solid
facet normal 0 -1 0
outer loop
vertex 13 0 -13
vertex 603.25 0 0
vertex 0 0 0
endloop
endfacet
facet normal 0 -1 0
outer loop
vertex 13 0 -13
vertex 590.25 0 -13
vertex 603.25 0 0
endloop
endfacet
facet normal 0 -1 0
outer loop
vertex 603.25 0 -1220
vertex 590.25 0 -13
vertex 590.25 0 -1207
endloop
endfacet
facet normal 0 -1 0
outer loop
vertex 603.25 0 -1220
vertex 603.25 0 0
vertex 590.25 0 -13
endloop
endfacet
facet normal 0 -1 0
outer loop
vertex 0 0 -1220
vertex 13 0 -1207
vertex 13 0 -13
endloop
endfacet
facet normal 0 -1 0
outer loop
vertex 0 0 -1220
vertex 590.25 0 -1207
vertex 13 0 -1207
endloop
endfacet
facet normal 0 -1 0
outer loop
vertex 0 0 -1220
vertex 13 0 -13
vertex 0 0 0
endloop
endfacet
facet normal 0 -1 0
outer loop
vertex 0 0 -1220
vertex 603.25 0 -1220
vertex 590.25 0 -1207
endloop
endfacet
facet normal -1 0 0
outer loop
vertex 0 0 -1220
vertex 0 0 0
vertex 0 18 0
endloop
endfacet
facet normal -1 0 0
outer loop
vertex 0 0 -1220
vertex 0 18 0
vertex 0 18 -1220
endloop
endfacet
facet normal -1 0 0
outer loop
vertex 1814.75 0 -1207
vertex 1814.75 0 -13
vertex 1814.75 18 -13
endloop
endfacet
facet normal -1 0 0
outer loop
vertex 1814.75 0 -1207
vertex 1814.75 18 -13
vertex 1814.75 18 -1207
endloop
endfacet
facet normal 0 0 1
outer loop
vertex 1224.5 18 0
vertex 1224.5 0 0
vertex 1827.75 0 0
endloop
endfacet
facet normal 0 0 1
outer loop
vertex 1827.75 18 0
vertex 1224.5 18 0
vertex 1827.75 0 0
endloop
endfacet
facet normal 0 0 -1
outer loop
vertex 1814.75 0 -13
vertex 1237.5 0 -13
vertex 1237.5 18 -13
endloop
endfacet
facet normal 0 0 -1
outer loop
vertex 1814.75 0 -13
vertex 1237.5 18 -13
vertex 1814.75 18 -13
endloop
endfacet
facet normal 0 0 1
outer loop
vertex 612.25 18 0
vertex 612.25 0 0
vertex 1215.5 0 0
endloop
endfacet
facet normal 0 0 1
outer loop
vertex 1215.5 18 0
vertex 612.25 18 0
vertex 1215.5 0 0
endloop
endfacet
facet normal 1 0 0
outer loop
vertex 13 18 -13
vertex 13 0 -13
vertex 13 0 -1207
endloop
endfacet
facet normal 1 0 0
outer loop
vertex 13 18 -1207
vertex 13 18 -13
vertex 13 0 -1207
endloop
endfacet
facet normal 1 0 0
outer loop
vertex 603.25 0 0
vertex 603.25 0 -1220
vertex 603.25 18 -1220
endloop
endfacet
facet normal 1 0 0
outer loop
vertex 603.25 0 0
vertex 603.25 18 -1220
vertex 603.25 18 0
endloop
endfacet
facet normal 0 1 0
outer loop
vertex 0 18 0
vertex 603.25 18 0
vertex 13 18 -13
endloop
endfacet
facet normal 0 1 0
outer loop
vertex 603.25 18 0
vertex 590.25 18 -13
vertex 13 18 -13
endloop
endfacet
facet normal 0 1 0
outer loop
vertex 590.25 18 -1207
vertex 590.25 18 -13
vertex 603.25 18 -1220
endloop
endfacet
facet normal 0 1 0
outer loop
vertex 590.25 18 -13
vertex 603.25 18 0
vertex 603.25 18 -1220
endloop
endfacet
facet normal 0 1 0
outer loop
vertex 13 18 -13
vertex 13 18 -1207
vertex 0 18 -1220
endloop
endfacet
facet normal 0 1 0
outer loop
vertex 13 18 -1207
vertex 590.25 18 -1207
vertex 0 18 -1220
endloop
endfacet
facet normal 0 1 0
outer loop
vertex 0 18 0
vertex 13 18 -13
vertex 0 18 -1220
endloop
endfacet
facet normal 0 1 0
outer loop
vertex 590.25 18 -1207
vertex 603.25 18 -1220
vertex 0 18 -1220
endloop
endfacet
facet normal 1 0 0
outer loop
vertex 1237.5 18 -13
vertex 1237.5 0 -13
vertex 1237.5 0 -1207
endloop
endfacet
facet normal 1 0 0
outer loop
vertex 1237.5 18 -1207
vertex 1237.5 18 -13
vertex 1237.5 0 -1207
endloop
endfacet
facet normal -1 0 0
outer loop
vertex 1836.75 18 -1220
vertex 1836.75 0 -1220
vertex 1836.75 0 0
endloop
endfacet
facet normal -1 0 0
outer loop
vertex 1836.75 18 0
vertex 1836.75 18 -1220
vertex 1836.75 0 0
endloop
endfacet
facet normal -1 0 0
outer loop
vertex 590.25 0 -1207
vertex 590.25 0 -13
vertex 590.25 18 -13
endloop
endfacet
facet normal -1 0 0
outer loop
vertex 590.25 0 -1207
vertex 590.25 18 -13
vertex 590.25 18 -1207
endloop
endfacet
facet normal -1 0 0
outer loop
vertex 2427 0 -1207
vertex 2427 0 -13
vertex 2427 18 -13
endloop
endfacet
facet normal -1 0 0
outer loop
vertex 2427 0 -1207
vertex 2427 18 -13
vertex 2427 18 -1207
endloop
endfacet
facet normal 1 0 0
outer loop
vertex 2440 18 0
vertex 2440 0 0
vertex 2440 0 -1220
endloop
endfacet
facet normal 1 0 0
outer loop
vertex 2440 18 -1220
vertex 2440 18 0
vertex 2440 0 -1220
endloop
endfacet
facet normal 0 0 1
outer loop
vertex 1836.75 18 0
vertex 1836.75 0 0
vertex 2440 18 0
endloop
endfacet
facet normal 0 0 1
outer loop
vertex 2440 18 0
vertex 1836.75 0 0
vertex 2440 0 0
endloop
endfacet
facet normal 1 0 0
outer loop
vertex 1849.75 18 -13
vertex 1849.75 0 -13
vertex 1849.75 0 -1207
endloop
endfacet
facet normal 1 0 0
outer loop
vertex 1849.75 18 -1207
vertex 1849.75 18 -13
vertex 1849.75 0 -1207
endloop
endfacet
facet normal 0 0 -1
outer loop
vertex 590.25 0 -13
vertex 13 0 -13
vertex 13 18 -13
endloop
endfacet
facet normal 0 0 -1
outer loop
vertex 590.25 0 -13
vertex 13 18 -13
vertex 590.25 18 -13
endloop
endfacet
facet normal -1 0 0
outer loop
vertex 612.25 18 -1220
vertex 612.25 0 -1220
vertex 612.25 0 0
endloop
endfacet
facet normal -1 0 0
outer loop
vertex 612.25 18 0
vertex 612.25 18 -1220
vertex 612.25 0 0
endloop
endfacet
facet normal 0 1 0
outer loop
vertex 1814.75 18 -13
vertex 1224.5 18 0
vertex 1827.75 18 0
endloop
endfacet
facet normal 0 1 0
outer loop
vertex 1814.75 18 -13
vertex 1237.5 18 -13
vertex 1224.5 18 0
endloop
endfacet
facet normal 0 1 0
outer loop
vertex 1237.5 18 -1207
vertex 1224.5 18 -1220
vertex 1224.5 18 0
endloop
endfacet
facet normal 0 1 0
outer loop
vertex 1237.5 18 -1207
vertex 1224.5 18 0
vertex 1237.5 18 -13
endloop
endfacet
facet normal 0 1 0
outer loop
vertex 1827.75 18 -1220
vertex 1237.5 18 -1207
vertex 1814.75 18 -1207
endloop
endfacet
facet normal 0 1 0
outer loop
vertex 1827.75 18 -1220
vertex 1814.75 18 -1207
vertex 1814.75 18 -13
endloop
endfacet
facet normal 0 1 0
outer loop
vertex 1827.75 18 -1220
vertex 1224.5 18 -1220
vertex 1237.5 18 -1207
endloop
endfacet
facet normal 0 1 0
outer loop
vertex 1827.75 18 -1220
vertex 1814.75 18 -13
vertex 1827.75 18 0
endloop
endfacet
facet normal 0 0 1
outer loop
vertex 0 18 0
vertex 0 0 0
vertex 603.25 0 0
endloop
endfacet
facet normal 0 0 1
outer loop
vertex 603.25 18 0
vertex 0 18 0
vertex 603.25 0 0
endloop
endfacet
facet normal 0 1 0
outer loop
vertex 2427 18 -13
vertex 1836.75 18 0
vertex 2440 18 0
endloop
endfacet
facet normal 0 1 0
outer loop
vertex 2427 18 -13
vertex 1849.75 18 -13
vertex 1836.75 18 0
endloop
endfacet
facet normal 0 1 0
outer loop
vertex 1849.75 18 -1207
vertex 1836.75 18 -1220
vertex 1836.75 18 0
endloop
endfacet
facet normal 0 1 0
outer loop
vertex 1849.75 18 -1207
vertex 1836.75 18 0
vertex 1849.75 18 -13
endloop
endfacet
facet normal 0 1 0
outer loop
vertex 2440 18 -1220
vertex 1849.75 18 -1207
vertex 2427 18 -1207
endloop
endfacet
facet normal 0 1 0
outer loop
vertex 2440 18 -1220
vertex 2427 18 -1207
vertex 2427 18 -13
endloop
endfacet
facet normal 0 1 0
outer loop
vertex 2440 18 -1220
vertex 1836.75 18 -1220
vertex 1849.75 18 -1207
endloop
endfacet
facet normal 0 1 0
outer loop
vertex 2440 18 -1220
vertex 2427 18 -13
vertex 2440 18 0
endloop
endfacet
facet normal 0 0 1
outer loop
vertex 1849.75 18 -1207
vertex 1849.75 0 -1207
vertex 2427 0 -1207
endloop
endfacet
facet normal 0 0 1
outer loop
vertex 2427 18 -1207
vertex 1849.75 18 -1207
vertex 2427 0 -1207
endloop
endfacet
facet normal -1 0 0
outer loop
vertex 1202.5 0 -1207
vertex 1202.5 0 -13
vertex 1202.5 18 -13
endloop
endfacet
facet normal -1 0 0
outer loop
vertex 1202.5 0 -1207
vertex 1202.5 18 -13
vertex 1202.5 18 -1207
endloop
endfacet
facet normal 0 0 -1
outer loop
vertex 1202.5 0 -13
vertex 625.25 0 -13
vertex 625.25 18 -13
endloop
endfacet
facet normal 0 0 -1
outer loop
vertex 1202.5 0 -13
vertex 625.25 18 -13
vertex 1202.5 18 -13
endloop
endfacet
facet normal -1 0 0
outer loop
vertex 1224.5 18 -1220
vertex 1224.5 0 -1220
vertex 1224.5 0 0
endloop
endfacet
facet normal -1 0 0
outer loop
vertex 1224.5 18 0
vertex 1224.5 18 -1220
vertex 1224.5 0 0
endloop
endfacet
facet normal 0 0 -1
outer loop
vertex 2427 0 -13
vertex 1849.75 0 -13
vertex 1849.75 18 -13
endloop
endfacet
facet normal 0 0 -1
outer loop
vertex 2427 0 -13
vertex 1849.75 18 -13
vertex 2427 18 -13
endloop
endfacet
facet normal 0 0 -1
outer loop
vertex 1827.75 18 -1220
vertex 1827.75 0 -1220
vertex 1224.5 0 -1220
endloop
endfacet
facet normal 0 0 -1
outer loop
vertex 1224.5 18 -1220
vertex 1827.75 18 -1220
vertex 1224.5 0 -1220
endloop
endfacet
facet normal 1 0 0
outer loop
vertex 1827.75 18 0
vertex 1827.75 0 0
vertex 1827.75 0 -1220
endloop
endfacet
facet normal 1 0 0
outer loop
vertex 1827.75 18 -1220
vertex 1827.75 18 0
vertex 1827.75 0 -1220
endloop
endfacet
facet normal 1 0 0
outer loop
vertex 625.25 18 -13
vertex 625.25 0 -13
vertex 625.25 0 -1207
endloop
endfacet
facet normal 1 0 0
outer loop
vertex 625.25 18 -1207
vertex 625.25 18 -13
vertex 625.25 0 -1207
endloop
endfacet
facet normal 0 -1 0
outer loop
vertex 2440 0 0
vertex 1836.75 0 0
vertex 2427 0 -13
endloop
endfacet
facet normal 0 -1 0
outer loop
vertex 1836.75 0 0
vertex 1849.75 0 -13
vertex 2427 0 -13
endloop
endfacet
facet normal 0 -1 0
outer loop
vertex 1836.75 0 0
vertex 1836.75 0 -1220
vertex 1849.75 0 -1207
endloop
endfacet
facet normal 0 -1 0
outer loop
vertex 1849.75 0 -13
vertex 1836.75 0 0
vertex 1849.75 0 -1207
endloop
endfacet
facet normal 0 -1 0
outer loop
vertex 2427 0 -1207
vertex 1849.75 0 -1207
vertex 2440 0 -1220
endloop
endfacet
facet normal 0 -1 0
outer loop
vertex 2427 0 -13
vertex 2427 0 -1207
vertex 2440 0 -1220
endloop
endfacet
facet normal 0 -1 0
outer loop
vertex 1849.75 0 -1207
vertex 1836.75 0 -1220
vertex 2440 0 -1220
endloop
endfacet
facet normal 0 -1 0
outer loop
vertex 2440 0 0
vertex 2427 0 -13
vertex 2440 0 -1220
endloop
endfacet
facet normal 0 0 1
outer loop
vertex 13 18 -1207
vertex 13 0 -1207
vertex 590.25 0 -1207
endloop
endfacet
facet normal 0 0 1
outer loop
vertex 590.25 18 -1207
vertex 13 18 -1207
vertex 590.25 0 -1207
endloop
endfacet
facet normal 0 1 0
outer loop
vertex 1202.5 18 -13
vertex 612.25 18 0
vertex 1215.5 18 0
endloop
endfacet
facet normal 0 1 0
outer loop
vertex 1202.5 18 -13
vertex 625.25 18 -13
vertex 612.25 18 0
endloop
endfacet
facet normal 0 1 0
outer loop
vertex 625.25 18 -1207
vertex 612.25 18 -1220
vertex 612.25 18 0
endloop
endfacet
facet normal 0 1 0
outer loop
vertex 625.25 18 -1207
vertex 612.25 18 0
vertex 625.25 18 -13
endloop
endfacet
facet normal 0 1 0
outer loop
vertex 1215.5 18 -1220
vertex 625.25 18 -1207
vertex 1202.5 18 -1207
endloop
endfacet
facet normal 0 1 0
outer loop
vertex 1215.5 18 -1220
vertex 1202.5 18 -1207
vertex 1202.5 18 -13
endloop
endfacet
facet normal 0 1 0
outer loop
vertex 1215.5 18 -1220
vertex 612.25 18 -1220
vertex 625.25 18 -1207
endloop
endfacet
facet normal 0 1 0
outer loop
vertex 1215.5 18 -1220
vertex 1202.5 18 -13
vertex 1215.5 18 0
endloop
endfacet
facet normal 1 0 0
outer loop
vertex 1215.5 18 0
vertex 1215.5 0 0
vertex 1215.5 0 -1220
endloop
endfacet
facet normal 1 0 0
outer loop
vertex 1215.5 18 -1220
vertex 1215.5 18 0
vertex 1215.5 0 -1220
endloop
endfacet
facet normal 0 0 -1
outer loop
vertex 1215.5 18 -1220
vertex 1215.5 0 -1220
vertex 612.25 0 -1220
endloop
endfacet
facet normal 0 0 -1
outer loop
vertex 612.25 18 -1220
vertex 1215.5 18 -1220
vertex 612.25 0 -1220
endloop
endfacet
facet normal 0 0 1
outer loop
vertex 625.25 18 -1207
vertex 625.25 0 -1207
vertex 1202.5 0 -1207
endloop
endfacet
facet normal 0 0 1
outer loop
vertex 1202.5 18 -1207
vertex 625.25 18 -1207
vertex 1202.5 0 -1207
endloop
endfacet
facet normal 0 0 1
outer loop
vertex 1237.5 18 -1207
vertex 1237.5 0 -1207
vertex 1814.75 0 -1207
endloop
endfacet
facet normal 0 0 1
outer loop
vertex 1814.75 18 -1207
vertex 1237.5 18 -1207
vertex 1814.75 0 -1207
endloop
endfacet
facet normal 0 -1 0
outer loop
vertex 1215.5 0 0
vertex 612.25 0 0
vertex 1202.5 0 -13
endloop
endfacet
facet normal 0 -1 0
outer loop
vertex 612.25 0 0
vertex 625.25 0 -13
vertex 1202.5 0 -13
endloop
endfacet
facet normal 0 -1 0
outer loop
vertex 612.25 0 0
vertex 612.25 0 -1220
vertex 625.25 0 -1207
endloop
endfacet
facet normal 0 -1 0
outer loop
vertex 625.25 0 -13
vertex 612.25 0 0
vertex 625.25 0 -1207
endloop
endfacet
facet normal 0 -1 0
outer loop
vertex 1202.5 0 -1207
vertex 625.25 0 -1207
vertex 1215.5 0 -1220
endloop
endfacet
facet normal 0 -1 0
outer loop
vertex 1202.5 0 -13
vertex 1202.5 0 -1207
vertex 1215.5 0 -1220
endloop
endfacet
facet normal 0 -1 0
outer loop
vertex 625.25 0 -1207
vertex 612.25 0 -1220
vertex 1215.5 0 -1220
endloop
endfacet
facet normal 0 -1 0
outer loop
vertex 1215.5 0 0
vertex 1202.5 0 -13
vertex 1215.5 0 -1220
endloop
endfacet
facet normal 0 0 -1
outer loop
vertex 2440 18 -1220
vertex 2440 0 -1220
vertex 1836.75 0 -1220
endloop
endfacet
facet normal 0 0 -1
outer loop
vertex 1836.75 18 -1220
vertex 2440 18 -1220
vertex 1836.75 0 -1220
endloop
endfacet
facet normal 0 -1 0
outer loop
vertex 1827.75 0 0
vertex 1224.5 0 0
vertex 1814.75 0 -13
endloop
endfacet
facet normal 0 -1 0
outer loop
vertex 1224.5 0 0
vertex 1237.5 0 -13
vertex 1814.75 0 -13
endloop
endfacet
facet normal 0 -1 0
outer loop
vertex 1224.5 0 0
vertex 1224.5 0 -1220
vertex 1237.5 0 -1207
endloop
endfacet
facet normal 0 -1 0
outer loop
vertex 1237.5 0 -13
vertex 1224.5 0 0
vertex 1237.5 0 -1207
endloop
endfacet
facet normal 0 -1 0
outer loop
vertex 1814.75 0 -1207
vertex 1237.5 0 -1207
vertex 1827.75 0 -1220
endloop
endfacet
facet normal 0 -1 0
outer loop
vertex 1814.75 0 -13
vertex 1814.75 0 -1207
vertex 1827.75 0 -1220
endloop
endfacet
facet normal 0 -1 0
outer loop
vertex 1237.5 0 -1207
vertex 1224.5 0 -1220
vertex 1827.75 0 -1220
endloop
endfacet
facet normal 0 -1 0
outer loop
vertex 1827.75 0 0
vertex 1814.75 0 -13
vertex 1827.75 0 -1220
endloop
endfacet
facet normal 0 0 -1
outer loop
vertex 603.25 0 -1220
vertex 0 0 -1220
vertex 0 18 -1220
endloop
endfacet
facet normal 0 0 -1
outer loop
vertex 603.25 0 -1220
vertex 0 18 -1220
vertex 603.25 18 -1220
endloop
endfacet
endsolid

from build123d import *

# Parameters (mm, degrees)
SKETCH1_W            = 577.25
SKETCH1_H            = 1194
BOSS_EXTRU_1_DEPTH   = 18
BOSS_EXTRU_1_2_DEPTH = 18
BOSS_EXTRU_1_3_DEPTH = 18
BOSS_EXTRU_1_4_DEPTH = 18


with BuildPart() as part:
    # Sketch1 → Boss.-Extru.1 (new body)
    with BuildSketch(Plane(origin=(0, 0, 0), x_dir=(1, 0, 0), z_dir=(0, 1, 0))):
        Polygon((0, 0), (0, 1220), (603.25, 1220), (603.25, 0), (590.25, 0), (13, 0), align=None)
        with Locations((301.625, 610)):
            Rectangle(SKETCH1_W, SKETCH1_H, mode=Mode.SUBTRACT)
    extrude(amount=BOSS_EXTRU_1_DEPTH)


with BuildPart() as body_2:
    # Sketch1 → Boss.-Extru.1 2 (new body)
    with BuildSketch(Plane(origin=(0, 0, 0), x_dir=(1, 0, 0), z_dir=(0, 1, 0))):
        Polygon((2440, 0), (2440, 1220), (1836.75, 1220), (1836.75, 0), (1849.75, 0), (2427, 0), align=None)
        with Locations((2138.375, 610)):
            Rectangle(SKETCH1_W, SKETCH1_H, mode=Mode.SUBTRACT)
    extrude(amount=BOSS_EXTRU_1_2_DEPTH)


with BuildPart() as body_3:
    # Sketch1 → Boss.-Extru.1 3 (new body)
    with BuildSketch(Plane(origin=(0, 0, 0), x_dir=(1, 0, 0), z_dir=(0, 1, 0))):
        Polygon((625.25, 0), (1202.5, 0), (1215.5, 0), (1215.5, 1220), (612.25, 1220), (612.25, 0), align=None)
        with Locations((913.875, 610)):
            Rectangle(SKETCH1_W, SKETCH1_H, mode=Mode.SUBTRACT)
    extrude(amount=BOSS_EXTRU_1_3_DEPTH)


with BuildPart() as body_4:
    # Sketch1 → Boss.-Extru.1 4 (new body)
    with BuildSketch(Plane(origin=(0, 0, 0), x_dir=(1, 0, 0), z_dir=(0, 1, 0))):
        Polygon((1237.5, 0), (1814.75, 0), (1827.75, 0), (1827.75, 1220), (1224.5, 1220), (1224.5, 0), align=None)
        with Locations((1526.125, 610)):
            Rectangle(SKETCH1_W, SKETCH1_H, mode=Mode.SUBTRACT)
    extrude(amount=BOSS_EXTRU_1_4_DEPTH)


solid = Compound([part.part, body_2.part, body_3.part, body_4.part])
